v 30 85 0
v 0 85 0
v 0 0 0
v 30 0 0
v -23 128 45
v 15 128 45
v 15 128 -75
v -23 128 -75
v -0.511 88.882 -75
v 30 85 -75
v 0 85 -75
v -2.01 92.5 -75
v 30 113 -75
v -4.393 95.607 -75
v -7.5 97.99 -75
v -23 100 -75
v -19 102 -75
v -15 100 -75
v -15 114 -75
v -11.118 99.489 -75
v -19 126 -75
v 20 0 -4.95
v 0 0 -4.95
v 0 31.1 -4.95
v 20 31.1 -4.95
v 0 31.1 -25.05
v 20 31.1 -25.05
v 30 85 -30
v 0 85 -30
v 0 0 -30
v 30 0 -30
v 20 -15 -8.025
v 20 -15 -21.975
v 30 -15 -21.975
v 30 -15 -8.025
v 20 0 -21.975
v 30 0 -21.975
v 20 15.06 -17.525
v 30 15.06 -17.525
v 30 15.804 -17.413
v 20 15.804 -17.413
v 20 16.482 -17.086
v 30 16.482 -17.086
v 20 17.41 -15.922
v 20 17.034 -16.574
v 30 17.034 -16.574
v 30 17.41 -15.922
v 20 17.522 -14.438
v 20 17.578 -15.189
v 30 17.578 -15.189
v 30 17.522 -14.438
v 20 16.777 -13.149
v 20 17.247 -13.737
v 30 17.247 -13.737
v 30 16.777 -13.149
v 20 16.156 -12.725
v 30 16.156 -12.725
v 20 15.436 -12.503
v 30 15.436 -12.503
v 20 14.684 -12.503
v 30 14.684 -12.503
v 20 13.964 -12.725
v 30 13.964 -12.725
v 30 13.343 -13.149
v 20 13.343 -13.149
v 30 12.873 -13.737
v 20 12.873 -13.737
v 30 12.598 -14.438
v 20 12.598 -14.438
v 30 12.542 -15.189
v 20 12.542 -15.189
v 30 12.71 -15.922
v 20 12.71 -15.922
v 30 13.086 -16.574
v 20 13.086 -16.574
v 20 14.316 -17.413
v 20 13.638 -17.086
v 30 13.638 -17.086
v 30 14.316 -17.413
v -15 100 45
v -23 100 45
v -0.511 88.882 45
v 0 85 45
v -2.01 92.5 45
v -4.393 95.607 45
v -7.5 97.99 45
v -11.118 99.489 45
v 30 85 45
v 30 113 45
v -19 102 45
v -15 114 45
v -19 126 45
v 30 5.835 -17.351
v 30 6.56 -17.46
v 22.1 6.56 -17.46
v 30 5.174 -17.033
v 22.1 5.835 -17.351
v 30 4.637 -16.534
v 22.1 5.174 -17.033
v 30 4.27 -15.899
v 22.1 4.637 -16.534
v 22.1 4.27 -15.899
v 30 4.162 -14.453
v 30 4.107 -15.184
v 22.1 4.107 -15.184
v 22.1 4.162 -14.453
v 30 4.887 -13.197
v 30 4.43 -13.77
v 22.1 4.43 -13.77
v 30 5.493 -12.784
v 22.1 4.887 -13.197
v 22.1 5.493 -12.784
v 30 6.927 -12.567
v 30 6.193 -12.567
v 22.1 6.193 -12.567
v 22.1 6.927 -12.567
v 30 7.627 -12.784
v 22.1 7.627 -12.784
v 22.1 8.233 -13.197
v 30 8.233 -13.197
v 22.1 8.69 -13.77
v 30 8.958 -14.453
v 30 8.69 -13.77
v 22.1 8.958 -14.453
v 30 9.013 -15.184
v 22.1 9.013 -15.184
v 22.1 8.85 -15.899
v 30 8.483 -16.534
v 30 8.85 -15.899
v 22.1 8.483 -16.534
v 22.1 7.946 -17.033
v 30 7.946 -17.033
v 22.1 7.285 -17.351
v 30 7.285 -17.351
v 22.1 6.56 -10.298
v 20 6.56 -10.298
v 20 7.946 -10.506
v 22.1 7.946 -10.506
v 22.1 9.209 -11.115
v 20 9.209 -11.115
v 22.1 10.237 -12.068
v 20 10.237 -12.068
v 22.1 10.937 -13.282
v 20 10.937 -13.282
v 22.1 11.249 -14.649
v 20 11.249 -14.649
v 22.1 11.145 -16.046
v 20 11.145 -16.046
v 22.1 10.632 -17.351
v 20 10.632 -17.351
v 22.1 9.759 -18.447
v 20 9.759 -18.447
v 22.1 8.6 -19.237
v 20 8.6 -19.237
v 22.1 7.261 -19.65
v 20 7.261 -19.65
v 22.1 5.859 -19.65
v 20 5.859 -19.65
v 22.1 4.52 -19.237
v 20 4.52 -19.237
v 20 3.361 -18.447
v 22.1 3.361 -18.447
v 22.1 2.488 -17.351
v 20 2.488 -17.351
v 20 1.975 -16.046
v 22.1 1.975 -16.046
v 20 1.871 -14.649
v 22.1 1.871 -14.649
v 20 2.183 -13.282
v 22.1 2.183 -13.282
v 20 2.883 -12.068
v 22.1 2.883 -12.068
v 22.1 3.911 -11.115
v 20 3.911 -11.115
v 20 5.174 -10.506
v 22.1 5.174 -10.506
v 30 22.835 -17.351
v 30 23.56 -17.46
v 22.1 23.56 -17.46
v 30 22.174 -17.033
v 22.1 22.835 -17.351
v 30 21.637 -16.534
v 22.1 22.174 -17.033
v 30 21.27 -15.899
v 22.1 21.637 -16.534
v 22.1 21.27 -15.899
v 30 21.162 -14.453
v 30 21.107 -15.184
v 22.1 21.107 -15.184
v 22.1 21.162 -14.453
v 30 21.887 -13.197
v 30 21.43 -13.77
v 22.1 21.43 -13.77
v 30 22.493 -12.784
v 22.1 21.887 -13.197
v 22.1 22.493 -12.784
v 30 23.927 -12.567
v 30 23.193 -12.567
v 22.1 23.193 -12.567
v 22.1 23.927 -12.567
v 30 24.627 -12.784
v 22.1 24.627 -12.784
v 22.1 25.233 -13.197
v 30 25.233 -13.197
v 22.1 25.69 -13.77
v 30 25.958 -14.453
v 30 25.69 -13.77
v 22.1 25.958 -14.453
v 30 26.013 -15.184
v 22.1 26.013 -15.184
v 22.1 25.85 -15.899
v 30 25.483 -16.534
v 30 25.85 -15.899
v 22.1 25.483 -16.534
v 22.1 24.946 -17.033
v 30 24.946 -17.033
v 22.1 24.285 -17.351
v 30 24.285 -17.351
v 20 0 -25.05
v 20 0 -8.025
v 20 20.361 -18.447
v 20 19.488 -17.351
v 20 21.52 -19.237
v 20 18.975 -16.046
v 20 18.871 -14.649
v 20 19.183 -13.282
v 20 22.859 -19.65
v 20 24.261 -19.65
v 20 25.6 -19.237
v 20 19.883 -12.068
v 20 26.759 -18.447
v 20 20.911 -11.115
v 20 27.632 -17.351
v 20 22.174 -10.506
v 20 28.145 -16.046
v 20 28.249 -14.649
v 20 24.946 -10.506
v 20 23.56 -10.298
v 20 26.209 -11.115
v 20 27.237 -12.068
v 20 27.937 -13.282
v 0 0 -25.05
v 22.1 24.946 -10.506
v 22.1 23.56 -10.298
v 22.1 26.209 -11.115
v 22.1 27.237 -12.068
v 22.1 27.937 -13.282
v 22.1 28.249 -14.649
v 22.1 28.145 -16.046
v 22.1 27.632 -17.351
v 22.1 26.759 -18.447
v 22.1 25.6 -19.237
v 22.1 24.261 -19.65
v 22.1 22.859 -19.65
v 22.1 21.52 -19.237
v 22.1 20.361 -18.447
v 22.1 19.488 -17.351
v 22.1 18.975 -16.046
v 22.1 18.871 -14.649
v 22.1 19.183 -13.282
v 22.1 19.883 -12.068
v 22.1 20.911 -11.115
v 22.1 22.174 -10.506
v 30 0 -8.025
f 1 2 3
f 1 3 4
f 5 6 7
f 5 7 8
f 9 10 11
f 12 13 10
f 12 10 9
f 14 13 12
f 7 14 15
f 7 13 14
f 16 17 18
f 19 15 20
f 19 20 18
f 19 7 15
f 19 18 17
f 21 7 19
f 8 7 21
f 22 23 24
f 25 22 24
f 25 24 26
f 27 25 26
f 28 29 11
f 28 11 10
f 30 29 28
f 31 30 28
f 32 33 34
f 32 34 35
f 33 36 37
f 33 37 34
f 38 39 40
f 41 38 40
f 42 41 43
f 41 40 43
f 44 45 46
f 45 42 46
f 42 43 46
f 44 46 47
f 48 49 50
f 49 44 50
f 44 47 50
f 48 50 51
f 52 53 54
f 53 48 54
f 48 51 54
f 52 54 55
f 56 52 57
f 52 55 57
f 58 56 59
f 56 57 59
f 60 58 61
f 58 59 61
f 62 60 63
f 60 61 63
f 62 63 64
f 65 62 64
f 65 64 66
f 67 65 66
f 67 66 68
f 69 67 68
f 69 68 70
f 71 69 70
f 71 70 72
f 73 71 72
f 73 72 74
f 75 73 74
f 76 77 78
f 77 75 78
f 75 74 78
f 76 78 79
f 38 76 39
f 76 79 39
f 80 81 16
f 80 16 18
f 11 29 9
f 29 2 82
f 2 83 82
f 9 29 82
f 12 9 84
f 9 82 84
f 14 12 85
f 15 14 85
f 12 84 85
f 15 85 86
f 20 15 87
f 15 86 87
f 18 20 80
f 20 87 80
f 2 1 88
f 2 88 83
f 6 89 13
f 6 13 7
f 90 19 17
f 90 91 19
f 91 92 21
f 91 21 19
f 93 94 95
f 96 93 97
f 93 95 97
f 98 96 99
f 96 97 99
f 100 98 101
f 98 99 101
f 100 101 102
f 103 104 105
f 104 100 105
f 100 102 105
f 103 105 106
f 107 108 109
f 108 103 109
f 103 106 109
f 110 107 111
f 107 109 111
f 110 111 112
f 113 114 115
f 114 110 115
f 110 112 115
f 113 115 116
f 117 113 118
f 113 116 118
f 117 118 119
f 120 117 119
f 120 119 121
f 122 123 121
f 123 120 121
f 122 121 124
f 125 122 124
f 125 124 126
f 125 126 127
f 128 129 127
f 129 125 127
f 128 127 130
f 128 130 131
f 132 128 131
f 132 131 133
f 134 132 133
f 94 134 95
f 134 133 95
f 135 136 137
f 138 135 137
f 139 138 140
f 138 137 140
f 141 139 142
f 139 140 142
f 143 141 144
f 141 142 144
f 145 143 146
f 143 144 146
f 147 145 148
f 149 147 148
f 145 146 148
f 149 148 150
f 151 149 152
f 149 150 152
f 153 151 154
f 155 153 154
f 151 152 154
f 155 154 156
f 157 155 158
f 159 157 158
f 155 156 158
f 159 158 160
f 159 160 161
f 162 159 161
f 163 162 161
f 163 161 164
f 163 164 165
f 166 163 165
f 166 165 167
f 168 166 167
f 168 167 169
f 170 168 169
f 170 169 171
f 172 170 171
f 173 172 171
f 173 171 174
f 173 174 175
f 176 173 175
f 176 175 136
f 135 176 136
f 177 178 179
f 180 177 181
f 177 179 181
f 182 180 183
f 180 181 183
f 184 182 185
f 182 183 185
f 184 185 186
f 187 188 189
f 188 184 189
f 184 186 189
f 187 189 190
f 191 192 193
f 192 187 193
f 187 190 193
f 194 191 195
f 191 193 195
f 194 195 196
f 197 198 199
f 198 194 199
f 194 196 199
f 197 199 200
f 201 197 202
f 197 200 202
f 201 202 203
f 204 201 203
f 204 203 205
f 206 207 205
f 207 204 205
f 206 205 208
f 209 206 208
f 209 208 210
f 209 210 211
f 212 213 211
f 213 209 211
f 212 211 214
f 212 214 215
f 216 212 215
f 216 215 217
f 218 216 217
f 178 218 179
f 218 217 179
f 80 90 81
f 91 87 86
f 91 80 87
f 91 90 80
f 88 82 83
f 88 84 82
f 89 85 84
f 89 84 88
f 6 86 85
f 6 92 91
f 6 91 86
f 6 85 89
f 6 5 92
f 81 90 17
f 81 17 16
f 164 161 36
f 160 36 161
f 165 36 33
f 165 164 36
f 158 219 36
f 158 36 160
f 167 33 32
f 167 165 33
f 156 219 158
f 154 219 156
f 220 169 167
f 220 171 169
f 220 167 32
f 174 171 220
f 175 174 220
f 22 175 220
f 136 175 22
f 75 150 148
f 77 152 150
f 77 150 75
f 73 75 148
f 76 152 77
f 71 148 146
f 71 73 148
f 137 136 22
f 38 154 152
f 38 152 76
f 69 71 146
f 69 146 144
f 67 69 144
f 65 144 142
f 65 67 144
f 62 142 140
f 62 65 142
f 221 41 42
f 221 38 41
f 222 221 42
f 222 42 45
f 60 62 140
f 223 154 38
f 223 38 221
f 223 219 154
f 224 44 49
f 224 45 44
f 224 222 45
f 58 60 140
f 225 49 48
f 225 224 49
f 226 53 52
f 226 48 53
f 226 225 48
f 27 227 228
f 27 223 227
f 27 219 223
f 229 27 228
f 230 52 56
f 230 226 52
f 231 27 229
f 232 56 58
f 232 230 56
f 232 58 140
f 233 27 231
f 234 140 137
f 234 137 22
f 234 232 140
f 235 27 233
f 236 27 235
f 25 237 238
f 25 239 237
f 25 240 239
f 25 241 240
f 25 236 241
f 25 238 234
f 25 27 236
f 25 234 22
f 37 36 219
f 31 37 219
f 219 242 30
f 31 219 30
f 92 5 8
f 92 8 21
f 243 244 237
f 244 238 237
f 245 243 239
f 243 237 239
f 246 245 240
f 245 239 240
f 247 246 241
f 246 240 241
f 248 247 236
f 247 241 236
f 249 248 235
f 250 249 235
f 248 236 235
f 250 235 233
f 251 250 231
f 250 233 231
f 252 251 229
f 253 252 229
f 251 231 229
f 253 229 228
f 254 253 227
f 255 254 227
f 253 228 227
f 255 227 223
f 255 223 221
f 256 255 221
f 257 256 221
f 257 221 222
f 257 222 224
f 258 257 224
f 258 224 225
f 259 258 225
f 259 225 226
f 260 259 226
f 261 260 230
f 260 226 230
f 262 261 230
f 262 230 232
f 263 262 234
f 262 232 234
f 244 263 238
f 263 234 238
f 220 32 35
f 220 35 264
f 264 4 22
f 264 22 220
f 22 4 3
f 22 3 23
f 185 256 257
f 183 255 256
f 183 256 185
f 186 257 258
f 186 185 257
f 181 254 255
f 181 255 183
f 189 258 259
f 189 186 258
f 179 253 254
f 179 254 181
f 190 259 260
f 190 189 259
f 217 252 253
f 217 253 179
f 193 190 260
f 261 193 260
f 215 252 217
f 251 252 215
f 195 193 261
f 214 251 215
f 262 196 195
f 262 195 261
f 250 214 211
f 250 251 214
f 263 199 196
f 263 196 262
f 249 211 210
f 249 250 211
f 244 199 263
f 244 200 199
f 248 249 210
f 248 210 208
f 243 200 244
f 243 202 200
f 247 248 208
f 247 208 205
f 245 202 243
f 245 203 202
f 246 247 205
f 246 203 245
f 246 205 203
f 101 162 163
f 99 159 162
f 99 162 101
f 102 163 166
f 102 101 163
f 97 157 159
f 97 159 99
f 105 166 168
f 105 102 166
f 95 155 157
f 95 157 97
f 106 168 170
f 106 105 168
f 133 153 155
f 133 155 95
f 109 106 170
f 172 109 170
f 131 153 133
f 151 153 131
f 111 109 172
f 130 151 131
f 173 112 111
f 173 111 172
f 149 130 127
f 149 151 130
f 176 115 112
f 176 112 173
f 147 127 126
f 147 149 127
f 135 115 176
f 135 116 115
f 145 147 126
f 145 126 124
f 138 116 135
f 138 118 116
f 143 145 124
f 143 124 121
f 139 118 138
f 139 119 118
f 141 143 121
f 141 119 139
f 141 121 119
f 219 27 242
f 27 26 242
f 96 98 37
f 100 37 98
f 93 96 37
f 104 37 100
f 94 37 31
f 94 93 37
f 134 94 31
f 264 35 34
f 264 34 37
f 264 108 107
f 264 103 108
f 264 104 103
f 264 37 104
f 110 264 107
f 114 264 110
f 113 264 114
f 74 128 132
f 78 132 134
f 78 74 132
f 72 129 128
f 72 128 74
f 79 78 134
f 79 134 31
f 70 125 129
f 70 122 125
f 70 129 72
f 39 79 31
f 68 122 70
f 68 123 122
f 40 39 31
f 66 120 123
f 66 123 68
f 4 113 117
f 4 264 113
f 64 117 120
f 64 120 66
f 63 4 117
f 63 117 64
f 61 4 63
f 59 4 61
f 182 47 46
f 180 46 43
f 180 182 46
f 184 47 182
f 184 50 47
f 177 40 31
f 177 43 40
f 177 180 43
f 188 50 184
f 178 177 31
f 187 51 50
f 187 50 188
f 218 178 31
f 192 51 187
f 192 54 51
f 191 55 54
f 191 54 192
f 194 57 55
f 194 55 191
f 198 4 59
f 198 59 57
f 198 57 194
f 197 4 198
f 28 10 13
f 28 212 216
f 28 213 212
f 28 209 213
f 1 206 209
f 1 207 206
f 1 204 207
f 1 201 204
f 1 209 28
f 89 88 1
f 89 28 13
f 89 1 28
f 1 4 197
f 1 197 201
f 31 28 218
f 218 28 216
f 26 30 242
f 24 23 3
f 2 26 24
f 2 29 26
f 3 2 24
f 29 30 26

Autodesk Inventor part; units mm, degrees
ref_plane "YZ Plane" through (0, 0, 0) normal (1, 0, 0) x (0, 1, 0)
ref_plane "XZ Plane" through (0, 0, 0) normal (0, 1, 0) x (-1, 0, 0)
sketch "Sketch1" plane through (0, 0, 0) normal (0, 0, 1) x (1, 0, 0)
  line L0 (0, 0) -> (25, 0)
  line L1 (25, 0) -> (25, 40)
  line L2 (25, 40) -> (0, 40)
  line L3 (0, 40) -> (0, 0)
  dimension "d1" = 25
  dimension "d2" = 40
  dimension "d3" = 25
extrude "Extrusion1" add sketch "Sketch1" against normal blind 30
sketch "Sketch2" plane through (25, 0, 0) normal (1, 0, 0) x (0, 0, -1)
  line L0 (0, 0) -> (30, 0) projected
  circle A0 centre (15, 6.56) radius 2.46
extrude "Extrusion2" cut sketch "Sketch2" against normal blind 30
sketch "Sketch3" plane through (0, 0, 0) normal (-1, 0, 0) x (0, 0, 1)
  line L0 (0, 0) -> (-30, 0) projected
  line L1 (-25.05, 0) -> (-4.95, 0)
  line L2 (-4.95, 0) -> (-4.95, 33.12)
  line L3 (-4.95, 33.12) -> (-25.05, 33.12)
  line L4 (-25.05, 33.12) -> (-25.05, 0)
  dimension "d11" = 20.1
extrude "Extrusion3" cut sketch "Sketch3" against normal blind 20
sketch "Sketch4" plane through (0, 0, 0) normal (0, -1, 0) x (1, 0, 0)
  line L0 (20, -4.95) -> (20, -25.05) projected
  line L1 (20, -15) -> (25, -15)
  line L2 (25, 0) -> (25, -30) projected
  line L3 (20, -8.025) -> (25, -8.025)
  line L4 (25, -8.025) -> (25, -21.975)
  line L5 (25, -21.975) -> (20, -21.975)
  line L6 (20, -21.975) -> (20, -8.025)
  line L7 (20, -8.025) -> (25, -21.975) construction
  line L8 (25, -8.025) -> (20, -21.975) construction
  line L9 (25, -12.54) -> (25, -17.46) projected
  point P0 (0, 0)
  point P1 (22.5, -15)
  dimension "d14" = 13.95
extrude "Extrusion4" add sketch "Sketch4" along normal blind 15
sketch "Sketch5" plane through (20, 0, 0) normal (-1, 0, 0) x (0, 0, 1)
  circle A0 centre (-15, 6.56) radius 2.46 projected
  circle A1 centre (-15, 6.56) radius 4.7025
  circle A2 centre (-15, 6.56) radius 2.46 projected
  circle A3 centre (-15, 6.56) radius 2.46
  point P0 (0, 0)
  dimension "d17" = 9.405
extrude "Extrusion5" cut sketch "Sketch5" against normal blind 2.1
sketch "Sketch6" plane through (25, 0, 0) normal (1, 0, 0) x (0, 0, -1)
  circle A0 centre (15, 6.56) radius 4.7025 projected
  line L0 (15, 6.56) -> (15, 23.56)
  circle A1 centre (15, 23.56) radius 2.46
  point P0 (0, 0)
  dimension "d20" = 17
  dimension "d21" = 4.92
extrude "Extrusion6" cut sketch "Sketch6" against normal blind 10 contours A1
sketch "Sketch7" plane through (20, 0, 0) normal (-1, 0, 0) x (0, 0, 1)
  circle A0 centre (-15, 23.56) radius 2.46 projected
  circle A1 centre (-15, 23.56) radius 4.7025
  point P0 (0, 0)
  dimension "d24" = 9.405
extrude "Extrusion7" cut sketch "Sketch7" against normal blind 2.1
sketch "Sketch9" plane through (25, 0, 0) normal (1, 0, 0) x (0, 0, -1)
  circle A0 centre (15, 6.56) radius 2.46 projected
  circle A1 centre (15, 6.56) radius 2.46
  circle A2 centre (15, 23.56) radius 2.46 projected
  circle A3 centre (15, 23.56) radius 2.46
  line L0 (30, 40) -> (30, 0) projected
  line L1 (30, 0) -> (30, 40)
  line L2 (30, 40) -> (0, 40)
  line L3 (0, 40) -> (0, 0)
  line L4 (0, 0) -> (8.025, 0) projected
  line L5 (21.975, 0) -> (21.975, -15)
  line L6 (21.975, -15) -> (8.025, -15)
  line L7 (8.025, -15) -> (8.025, 0)
  line L8 (0, 0) -> (8.025, 0)
  line L9 (21.975, 0) -> (30, 0)
extrude "Extrusion8" add sketch "Sketch9" along normal blind 5
sketch "Sketch10" plane through (0, 40, 0) normal (0, 1, 0) x (1, 0, 0)
  line L0 (0, 30) -> (30, 30) projected
  line L1 (30, 0) -> (0, 0) projected
  line L2 (0, 30) -> (30, 30)
  line L3 (30, 30) -> (30, 0)
  line L4 (30, 0) -> (0, 0)
  line L5 (0, 0) -> (0, 30)
extrude "Extrusion9" add sketch "Sketch10" along normal blind 30
sketch "Sketch12" plane through (30, 0, 0) normal (1, 0, 0) x (0, 0, -1)
  circle A0 centre (15, 6.56) radius 2.46 projected
  line L0 (15, 6.56) -> (15, 15.06)
  circle A1 centre (15, 15.06) radius 2.525
  point P0 (0, 0)
  dimension "d31" = 8.5
  dimension "d33" = 5.05
extrude "Extrusion10" cut sketch "Sketch12" against normal blind 30 contours A1
sketch "Sketch14" plane through (0, 0, 0) normal (0, 0, 1) x (1, 0, 0)
  line L0 (30, 70) -> (0, 70) projected
  line L1 (0, 70) -> (0, 85)
  line L2 (-15, 100) -> (-23, 100)
  line L3 (30, 0) -> (30, 70) projected
  line L4 (30, 113) -> (30, 70)
  arc A0 (0, 85) -> (-15, 100) centre (-15, 85) ccw
  line L5 (30, 105) -> (30, 100)
  line L6 (-23, 128) -> (15, 128)
  line L7 (-19, 126) -> (-23, 128)
  line L8 (-19, 126) -> (-15, 114)
  line L9 (-19, 102) -> (-23, 100)
  line L10 (-19, 102) -> (-15, 114)
  line L11 (30, 113) -> (15, 128)
  point P0 (0, 0)
  point P1 (0, 100)
  dimension "d47" = 30
  dimension "d54" = 15
  dimension "d69" = 28
extrude "Extrusion12" add sketch "Sketch14" against normal blind 30
sketch "Sketch15" plane through (0, 0, -25.05) normal (-1, 0, 0) x (0, 0, 1)
  line L0 (0, 33.12) -> (20.1, 33.12) projected
  line L1 (20.1, 33.12) -> (20.1, 0) projected
  line L2 (0, 33.12) -> (20.1, 33.12)
  line L3 (20.1, 33.12) -> (20.1, 31.1)
  line L4 (20.1, 31.1) -> (0, 31.1)
  line L5 (0, 31.1) -> (0, 33.12)
  point P0 (25.05, 0)
  dimension "d57" = 2.02
extrude "Extrusion13" add sketch "Sketch15" against normal blind 20
sketch "Sketch20" plane through (0, 0, 0) normal (0, 0, 1) x (1, 0, 0)
  arc A0 (0, 85) -> (-15, 100) centre (-15, 85) ccw projected
  arc A1 (0, 85) -> (-15, 100) centre (-15, 85) ccw
  line L0 (-15, 100) -> (-23, 100) projected
  line L1 (-15, 100) -> (-23, 100)
  line L2 (-23, 100) -> (-19, 102) projected
  line L3 (-23, 100) -> (-19, 102)
  line L4 (-19, 102) -> (-15, 114) projected
  line L5 (-19, 102) -> (-15, 114)
  line L6 (-15, 114) -> (-19, 126) projected
  line L7 (-15, 114) -> (-19, 126)
  line L8 (-19, 126) -> (-23, 128) projected
  line L9 (-19, 126) -> (-23, 128)
  line L10 (-23, 128) -> (15, 128) projected
  line L11 (-23, 128) -> (15, 128)
  line L12 (15, 128) -> (30, 113) projected
  line L13 (15, 128) -> (30, 113)
  line L14 (30, 113) -> (30, 85)
  line L15 (30, 0) -> (30, 113) projected
  line L16 (30, 85) -> (0, 85)
  point P0 (0, 0)
extrude "Extrusion14" add sketch "Sketch20" along normal blind 45
ref_plane "Work Plane1" through (0, 0, -15) normal (0, 0, 1) x (1, 0, 0)
mirror "Mirror1" about plane through (0, 0, -15) normal (0, 0, 1) of "Extrusion14"
properties part number "24mm_x_120mm"
